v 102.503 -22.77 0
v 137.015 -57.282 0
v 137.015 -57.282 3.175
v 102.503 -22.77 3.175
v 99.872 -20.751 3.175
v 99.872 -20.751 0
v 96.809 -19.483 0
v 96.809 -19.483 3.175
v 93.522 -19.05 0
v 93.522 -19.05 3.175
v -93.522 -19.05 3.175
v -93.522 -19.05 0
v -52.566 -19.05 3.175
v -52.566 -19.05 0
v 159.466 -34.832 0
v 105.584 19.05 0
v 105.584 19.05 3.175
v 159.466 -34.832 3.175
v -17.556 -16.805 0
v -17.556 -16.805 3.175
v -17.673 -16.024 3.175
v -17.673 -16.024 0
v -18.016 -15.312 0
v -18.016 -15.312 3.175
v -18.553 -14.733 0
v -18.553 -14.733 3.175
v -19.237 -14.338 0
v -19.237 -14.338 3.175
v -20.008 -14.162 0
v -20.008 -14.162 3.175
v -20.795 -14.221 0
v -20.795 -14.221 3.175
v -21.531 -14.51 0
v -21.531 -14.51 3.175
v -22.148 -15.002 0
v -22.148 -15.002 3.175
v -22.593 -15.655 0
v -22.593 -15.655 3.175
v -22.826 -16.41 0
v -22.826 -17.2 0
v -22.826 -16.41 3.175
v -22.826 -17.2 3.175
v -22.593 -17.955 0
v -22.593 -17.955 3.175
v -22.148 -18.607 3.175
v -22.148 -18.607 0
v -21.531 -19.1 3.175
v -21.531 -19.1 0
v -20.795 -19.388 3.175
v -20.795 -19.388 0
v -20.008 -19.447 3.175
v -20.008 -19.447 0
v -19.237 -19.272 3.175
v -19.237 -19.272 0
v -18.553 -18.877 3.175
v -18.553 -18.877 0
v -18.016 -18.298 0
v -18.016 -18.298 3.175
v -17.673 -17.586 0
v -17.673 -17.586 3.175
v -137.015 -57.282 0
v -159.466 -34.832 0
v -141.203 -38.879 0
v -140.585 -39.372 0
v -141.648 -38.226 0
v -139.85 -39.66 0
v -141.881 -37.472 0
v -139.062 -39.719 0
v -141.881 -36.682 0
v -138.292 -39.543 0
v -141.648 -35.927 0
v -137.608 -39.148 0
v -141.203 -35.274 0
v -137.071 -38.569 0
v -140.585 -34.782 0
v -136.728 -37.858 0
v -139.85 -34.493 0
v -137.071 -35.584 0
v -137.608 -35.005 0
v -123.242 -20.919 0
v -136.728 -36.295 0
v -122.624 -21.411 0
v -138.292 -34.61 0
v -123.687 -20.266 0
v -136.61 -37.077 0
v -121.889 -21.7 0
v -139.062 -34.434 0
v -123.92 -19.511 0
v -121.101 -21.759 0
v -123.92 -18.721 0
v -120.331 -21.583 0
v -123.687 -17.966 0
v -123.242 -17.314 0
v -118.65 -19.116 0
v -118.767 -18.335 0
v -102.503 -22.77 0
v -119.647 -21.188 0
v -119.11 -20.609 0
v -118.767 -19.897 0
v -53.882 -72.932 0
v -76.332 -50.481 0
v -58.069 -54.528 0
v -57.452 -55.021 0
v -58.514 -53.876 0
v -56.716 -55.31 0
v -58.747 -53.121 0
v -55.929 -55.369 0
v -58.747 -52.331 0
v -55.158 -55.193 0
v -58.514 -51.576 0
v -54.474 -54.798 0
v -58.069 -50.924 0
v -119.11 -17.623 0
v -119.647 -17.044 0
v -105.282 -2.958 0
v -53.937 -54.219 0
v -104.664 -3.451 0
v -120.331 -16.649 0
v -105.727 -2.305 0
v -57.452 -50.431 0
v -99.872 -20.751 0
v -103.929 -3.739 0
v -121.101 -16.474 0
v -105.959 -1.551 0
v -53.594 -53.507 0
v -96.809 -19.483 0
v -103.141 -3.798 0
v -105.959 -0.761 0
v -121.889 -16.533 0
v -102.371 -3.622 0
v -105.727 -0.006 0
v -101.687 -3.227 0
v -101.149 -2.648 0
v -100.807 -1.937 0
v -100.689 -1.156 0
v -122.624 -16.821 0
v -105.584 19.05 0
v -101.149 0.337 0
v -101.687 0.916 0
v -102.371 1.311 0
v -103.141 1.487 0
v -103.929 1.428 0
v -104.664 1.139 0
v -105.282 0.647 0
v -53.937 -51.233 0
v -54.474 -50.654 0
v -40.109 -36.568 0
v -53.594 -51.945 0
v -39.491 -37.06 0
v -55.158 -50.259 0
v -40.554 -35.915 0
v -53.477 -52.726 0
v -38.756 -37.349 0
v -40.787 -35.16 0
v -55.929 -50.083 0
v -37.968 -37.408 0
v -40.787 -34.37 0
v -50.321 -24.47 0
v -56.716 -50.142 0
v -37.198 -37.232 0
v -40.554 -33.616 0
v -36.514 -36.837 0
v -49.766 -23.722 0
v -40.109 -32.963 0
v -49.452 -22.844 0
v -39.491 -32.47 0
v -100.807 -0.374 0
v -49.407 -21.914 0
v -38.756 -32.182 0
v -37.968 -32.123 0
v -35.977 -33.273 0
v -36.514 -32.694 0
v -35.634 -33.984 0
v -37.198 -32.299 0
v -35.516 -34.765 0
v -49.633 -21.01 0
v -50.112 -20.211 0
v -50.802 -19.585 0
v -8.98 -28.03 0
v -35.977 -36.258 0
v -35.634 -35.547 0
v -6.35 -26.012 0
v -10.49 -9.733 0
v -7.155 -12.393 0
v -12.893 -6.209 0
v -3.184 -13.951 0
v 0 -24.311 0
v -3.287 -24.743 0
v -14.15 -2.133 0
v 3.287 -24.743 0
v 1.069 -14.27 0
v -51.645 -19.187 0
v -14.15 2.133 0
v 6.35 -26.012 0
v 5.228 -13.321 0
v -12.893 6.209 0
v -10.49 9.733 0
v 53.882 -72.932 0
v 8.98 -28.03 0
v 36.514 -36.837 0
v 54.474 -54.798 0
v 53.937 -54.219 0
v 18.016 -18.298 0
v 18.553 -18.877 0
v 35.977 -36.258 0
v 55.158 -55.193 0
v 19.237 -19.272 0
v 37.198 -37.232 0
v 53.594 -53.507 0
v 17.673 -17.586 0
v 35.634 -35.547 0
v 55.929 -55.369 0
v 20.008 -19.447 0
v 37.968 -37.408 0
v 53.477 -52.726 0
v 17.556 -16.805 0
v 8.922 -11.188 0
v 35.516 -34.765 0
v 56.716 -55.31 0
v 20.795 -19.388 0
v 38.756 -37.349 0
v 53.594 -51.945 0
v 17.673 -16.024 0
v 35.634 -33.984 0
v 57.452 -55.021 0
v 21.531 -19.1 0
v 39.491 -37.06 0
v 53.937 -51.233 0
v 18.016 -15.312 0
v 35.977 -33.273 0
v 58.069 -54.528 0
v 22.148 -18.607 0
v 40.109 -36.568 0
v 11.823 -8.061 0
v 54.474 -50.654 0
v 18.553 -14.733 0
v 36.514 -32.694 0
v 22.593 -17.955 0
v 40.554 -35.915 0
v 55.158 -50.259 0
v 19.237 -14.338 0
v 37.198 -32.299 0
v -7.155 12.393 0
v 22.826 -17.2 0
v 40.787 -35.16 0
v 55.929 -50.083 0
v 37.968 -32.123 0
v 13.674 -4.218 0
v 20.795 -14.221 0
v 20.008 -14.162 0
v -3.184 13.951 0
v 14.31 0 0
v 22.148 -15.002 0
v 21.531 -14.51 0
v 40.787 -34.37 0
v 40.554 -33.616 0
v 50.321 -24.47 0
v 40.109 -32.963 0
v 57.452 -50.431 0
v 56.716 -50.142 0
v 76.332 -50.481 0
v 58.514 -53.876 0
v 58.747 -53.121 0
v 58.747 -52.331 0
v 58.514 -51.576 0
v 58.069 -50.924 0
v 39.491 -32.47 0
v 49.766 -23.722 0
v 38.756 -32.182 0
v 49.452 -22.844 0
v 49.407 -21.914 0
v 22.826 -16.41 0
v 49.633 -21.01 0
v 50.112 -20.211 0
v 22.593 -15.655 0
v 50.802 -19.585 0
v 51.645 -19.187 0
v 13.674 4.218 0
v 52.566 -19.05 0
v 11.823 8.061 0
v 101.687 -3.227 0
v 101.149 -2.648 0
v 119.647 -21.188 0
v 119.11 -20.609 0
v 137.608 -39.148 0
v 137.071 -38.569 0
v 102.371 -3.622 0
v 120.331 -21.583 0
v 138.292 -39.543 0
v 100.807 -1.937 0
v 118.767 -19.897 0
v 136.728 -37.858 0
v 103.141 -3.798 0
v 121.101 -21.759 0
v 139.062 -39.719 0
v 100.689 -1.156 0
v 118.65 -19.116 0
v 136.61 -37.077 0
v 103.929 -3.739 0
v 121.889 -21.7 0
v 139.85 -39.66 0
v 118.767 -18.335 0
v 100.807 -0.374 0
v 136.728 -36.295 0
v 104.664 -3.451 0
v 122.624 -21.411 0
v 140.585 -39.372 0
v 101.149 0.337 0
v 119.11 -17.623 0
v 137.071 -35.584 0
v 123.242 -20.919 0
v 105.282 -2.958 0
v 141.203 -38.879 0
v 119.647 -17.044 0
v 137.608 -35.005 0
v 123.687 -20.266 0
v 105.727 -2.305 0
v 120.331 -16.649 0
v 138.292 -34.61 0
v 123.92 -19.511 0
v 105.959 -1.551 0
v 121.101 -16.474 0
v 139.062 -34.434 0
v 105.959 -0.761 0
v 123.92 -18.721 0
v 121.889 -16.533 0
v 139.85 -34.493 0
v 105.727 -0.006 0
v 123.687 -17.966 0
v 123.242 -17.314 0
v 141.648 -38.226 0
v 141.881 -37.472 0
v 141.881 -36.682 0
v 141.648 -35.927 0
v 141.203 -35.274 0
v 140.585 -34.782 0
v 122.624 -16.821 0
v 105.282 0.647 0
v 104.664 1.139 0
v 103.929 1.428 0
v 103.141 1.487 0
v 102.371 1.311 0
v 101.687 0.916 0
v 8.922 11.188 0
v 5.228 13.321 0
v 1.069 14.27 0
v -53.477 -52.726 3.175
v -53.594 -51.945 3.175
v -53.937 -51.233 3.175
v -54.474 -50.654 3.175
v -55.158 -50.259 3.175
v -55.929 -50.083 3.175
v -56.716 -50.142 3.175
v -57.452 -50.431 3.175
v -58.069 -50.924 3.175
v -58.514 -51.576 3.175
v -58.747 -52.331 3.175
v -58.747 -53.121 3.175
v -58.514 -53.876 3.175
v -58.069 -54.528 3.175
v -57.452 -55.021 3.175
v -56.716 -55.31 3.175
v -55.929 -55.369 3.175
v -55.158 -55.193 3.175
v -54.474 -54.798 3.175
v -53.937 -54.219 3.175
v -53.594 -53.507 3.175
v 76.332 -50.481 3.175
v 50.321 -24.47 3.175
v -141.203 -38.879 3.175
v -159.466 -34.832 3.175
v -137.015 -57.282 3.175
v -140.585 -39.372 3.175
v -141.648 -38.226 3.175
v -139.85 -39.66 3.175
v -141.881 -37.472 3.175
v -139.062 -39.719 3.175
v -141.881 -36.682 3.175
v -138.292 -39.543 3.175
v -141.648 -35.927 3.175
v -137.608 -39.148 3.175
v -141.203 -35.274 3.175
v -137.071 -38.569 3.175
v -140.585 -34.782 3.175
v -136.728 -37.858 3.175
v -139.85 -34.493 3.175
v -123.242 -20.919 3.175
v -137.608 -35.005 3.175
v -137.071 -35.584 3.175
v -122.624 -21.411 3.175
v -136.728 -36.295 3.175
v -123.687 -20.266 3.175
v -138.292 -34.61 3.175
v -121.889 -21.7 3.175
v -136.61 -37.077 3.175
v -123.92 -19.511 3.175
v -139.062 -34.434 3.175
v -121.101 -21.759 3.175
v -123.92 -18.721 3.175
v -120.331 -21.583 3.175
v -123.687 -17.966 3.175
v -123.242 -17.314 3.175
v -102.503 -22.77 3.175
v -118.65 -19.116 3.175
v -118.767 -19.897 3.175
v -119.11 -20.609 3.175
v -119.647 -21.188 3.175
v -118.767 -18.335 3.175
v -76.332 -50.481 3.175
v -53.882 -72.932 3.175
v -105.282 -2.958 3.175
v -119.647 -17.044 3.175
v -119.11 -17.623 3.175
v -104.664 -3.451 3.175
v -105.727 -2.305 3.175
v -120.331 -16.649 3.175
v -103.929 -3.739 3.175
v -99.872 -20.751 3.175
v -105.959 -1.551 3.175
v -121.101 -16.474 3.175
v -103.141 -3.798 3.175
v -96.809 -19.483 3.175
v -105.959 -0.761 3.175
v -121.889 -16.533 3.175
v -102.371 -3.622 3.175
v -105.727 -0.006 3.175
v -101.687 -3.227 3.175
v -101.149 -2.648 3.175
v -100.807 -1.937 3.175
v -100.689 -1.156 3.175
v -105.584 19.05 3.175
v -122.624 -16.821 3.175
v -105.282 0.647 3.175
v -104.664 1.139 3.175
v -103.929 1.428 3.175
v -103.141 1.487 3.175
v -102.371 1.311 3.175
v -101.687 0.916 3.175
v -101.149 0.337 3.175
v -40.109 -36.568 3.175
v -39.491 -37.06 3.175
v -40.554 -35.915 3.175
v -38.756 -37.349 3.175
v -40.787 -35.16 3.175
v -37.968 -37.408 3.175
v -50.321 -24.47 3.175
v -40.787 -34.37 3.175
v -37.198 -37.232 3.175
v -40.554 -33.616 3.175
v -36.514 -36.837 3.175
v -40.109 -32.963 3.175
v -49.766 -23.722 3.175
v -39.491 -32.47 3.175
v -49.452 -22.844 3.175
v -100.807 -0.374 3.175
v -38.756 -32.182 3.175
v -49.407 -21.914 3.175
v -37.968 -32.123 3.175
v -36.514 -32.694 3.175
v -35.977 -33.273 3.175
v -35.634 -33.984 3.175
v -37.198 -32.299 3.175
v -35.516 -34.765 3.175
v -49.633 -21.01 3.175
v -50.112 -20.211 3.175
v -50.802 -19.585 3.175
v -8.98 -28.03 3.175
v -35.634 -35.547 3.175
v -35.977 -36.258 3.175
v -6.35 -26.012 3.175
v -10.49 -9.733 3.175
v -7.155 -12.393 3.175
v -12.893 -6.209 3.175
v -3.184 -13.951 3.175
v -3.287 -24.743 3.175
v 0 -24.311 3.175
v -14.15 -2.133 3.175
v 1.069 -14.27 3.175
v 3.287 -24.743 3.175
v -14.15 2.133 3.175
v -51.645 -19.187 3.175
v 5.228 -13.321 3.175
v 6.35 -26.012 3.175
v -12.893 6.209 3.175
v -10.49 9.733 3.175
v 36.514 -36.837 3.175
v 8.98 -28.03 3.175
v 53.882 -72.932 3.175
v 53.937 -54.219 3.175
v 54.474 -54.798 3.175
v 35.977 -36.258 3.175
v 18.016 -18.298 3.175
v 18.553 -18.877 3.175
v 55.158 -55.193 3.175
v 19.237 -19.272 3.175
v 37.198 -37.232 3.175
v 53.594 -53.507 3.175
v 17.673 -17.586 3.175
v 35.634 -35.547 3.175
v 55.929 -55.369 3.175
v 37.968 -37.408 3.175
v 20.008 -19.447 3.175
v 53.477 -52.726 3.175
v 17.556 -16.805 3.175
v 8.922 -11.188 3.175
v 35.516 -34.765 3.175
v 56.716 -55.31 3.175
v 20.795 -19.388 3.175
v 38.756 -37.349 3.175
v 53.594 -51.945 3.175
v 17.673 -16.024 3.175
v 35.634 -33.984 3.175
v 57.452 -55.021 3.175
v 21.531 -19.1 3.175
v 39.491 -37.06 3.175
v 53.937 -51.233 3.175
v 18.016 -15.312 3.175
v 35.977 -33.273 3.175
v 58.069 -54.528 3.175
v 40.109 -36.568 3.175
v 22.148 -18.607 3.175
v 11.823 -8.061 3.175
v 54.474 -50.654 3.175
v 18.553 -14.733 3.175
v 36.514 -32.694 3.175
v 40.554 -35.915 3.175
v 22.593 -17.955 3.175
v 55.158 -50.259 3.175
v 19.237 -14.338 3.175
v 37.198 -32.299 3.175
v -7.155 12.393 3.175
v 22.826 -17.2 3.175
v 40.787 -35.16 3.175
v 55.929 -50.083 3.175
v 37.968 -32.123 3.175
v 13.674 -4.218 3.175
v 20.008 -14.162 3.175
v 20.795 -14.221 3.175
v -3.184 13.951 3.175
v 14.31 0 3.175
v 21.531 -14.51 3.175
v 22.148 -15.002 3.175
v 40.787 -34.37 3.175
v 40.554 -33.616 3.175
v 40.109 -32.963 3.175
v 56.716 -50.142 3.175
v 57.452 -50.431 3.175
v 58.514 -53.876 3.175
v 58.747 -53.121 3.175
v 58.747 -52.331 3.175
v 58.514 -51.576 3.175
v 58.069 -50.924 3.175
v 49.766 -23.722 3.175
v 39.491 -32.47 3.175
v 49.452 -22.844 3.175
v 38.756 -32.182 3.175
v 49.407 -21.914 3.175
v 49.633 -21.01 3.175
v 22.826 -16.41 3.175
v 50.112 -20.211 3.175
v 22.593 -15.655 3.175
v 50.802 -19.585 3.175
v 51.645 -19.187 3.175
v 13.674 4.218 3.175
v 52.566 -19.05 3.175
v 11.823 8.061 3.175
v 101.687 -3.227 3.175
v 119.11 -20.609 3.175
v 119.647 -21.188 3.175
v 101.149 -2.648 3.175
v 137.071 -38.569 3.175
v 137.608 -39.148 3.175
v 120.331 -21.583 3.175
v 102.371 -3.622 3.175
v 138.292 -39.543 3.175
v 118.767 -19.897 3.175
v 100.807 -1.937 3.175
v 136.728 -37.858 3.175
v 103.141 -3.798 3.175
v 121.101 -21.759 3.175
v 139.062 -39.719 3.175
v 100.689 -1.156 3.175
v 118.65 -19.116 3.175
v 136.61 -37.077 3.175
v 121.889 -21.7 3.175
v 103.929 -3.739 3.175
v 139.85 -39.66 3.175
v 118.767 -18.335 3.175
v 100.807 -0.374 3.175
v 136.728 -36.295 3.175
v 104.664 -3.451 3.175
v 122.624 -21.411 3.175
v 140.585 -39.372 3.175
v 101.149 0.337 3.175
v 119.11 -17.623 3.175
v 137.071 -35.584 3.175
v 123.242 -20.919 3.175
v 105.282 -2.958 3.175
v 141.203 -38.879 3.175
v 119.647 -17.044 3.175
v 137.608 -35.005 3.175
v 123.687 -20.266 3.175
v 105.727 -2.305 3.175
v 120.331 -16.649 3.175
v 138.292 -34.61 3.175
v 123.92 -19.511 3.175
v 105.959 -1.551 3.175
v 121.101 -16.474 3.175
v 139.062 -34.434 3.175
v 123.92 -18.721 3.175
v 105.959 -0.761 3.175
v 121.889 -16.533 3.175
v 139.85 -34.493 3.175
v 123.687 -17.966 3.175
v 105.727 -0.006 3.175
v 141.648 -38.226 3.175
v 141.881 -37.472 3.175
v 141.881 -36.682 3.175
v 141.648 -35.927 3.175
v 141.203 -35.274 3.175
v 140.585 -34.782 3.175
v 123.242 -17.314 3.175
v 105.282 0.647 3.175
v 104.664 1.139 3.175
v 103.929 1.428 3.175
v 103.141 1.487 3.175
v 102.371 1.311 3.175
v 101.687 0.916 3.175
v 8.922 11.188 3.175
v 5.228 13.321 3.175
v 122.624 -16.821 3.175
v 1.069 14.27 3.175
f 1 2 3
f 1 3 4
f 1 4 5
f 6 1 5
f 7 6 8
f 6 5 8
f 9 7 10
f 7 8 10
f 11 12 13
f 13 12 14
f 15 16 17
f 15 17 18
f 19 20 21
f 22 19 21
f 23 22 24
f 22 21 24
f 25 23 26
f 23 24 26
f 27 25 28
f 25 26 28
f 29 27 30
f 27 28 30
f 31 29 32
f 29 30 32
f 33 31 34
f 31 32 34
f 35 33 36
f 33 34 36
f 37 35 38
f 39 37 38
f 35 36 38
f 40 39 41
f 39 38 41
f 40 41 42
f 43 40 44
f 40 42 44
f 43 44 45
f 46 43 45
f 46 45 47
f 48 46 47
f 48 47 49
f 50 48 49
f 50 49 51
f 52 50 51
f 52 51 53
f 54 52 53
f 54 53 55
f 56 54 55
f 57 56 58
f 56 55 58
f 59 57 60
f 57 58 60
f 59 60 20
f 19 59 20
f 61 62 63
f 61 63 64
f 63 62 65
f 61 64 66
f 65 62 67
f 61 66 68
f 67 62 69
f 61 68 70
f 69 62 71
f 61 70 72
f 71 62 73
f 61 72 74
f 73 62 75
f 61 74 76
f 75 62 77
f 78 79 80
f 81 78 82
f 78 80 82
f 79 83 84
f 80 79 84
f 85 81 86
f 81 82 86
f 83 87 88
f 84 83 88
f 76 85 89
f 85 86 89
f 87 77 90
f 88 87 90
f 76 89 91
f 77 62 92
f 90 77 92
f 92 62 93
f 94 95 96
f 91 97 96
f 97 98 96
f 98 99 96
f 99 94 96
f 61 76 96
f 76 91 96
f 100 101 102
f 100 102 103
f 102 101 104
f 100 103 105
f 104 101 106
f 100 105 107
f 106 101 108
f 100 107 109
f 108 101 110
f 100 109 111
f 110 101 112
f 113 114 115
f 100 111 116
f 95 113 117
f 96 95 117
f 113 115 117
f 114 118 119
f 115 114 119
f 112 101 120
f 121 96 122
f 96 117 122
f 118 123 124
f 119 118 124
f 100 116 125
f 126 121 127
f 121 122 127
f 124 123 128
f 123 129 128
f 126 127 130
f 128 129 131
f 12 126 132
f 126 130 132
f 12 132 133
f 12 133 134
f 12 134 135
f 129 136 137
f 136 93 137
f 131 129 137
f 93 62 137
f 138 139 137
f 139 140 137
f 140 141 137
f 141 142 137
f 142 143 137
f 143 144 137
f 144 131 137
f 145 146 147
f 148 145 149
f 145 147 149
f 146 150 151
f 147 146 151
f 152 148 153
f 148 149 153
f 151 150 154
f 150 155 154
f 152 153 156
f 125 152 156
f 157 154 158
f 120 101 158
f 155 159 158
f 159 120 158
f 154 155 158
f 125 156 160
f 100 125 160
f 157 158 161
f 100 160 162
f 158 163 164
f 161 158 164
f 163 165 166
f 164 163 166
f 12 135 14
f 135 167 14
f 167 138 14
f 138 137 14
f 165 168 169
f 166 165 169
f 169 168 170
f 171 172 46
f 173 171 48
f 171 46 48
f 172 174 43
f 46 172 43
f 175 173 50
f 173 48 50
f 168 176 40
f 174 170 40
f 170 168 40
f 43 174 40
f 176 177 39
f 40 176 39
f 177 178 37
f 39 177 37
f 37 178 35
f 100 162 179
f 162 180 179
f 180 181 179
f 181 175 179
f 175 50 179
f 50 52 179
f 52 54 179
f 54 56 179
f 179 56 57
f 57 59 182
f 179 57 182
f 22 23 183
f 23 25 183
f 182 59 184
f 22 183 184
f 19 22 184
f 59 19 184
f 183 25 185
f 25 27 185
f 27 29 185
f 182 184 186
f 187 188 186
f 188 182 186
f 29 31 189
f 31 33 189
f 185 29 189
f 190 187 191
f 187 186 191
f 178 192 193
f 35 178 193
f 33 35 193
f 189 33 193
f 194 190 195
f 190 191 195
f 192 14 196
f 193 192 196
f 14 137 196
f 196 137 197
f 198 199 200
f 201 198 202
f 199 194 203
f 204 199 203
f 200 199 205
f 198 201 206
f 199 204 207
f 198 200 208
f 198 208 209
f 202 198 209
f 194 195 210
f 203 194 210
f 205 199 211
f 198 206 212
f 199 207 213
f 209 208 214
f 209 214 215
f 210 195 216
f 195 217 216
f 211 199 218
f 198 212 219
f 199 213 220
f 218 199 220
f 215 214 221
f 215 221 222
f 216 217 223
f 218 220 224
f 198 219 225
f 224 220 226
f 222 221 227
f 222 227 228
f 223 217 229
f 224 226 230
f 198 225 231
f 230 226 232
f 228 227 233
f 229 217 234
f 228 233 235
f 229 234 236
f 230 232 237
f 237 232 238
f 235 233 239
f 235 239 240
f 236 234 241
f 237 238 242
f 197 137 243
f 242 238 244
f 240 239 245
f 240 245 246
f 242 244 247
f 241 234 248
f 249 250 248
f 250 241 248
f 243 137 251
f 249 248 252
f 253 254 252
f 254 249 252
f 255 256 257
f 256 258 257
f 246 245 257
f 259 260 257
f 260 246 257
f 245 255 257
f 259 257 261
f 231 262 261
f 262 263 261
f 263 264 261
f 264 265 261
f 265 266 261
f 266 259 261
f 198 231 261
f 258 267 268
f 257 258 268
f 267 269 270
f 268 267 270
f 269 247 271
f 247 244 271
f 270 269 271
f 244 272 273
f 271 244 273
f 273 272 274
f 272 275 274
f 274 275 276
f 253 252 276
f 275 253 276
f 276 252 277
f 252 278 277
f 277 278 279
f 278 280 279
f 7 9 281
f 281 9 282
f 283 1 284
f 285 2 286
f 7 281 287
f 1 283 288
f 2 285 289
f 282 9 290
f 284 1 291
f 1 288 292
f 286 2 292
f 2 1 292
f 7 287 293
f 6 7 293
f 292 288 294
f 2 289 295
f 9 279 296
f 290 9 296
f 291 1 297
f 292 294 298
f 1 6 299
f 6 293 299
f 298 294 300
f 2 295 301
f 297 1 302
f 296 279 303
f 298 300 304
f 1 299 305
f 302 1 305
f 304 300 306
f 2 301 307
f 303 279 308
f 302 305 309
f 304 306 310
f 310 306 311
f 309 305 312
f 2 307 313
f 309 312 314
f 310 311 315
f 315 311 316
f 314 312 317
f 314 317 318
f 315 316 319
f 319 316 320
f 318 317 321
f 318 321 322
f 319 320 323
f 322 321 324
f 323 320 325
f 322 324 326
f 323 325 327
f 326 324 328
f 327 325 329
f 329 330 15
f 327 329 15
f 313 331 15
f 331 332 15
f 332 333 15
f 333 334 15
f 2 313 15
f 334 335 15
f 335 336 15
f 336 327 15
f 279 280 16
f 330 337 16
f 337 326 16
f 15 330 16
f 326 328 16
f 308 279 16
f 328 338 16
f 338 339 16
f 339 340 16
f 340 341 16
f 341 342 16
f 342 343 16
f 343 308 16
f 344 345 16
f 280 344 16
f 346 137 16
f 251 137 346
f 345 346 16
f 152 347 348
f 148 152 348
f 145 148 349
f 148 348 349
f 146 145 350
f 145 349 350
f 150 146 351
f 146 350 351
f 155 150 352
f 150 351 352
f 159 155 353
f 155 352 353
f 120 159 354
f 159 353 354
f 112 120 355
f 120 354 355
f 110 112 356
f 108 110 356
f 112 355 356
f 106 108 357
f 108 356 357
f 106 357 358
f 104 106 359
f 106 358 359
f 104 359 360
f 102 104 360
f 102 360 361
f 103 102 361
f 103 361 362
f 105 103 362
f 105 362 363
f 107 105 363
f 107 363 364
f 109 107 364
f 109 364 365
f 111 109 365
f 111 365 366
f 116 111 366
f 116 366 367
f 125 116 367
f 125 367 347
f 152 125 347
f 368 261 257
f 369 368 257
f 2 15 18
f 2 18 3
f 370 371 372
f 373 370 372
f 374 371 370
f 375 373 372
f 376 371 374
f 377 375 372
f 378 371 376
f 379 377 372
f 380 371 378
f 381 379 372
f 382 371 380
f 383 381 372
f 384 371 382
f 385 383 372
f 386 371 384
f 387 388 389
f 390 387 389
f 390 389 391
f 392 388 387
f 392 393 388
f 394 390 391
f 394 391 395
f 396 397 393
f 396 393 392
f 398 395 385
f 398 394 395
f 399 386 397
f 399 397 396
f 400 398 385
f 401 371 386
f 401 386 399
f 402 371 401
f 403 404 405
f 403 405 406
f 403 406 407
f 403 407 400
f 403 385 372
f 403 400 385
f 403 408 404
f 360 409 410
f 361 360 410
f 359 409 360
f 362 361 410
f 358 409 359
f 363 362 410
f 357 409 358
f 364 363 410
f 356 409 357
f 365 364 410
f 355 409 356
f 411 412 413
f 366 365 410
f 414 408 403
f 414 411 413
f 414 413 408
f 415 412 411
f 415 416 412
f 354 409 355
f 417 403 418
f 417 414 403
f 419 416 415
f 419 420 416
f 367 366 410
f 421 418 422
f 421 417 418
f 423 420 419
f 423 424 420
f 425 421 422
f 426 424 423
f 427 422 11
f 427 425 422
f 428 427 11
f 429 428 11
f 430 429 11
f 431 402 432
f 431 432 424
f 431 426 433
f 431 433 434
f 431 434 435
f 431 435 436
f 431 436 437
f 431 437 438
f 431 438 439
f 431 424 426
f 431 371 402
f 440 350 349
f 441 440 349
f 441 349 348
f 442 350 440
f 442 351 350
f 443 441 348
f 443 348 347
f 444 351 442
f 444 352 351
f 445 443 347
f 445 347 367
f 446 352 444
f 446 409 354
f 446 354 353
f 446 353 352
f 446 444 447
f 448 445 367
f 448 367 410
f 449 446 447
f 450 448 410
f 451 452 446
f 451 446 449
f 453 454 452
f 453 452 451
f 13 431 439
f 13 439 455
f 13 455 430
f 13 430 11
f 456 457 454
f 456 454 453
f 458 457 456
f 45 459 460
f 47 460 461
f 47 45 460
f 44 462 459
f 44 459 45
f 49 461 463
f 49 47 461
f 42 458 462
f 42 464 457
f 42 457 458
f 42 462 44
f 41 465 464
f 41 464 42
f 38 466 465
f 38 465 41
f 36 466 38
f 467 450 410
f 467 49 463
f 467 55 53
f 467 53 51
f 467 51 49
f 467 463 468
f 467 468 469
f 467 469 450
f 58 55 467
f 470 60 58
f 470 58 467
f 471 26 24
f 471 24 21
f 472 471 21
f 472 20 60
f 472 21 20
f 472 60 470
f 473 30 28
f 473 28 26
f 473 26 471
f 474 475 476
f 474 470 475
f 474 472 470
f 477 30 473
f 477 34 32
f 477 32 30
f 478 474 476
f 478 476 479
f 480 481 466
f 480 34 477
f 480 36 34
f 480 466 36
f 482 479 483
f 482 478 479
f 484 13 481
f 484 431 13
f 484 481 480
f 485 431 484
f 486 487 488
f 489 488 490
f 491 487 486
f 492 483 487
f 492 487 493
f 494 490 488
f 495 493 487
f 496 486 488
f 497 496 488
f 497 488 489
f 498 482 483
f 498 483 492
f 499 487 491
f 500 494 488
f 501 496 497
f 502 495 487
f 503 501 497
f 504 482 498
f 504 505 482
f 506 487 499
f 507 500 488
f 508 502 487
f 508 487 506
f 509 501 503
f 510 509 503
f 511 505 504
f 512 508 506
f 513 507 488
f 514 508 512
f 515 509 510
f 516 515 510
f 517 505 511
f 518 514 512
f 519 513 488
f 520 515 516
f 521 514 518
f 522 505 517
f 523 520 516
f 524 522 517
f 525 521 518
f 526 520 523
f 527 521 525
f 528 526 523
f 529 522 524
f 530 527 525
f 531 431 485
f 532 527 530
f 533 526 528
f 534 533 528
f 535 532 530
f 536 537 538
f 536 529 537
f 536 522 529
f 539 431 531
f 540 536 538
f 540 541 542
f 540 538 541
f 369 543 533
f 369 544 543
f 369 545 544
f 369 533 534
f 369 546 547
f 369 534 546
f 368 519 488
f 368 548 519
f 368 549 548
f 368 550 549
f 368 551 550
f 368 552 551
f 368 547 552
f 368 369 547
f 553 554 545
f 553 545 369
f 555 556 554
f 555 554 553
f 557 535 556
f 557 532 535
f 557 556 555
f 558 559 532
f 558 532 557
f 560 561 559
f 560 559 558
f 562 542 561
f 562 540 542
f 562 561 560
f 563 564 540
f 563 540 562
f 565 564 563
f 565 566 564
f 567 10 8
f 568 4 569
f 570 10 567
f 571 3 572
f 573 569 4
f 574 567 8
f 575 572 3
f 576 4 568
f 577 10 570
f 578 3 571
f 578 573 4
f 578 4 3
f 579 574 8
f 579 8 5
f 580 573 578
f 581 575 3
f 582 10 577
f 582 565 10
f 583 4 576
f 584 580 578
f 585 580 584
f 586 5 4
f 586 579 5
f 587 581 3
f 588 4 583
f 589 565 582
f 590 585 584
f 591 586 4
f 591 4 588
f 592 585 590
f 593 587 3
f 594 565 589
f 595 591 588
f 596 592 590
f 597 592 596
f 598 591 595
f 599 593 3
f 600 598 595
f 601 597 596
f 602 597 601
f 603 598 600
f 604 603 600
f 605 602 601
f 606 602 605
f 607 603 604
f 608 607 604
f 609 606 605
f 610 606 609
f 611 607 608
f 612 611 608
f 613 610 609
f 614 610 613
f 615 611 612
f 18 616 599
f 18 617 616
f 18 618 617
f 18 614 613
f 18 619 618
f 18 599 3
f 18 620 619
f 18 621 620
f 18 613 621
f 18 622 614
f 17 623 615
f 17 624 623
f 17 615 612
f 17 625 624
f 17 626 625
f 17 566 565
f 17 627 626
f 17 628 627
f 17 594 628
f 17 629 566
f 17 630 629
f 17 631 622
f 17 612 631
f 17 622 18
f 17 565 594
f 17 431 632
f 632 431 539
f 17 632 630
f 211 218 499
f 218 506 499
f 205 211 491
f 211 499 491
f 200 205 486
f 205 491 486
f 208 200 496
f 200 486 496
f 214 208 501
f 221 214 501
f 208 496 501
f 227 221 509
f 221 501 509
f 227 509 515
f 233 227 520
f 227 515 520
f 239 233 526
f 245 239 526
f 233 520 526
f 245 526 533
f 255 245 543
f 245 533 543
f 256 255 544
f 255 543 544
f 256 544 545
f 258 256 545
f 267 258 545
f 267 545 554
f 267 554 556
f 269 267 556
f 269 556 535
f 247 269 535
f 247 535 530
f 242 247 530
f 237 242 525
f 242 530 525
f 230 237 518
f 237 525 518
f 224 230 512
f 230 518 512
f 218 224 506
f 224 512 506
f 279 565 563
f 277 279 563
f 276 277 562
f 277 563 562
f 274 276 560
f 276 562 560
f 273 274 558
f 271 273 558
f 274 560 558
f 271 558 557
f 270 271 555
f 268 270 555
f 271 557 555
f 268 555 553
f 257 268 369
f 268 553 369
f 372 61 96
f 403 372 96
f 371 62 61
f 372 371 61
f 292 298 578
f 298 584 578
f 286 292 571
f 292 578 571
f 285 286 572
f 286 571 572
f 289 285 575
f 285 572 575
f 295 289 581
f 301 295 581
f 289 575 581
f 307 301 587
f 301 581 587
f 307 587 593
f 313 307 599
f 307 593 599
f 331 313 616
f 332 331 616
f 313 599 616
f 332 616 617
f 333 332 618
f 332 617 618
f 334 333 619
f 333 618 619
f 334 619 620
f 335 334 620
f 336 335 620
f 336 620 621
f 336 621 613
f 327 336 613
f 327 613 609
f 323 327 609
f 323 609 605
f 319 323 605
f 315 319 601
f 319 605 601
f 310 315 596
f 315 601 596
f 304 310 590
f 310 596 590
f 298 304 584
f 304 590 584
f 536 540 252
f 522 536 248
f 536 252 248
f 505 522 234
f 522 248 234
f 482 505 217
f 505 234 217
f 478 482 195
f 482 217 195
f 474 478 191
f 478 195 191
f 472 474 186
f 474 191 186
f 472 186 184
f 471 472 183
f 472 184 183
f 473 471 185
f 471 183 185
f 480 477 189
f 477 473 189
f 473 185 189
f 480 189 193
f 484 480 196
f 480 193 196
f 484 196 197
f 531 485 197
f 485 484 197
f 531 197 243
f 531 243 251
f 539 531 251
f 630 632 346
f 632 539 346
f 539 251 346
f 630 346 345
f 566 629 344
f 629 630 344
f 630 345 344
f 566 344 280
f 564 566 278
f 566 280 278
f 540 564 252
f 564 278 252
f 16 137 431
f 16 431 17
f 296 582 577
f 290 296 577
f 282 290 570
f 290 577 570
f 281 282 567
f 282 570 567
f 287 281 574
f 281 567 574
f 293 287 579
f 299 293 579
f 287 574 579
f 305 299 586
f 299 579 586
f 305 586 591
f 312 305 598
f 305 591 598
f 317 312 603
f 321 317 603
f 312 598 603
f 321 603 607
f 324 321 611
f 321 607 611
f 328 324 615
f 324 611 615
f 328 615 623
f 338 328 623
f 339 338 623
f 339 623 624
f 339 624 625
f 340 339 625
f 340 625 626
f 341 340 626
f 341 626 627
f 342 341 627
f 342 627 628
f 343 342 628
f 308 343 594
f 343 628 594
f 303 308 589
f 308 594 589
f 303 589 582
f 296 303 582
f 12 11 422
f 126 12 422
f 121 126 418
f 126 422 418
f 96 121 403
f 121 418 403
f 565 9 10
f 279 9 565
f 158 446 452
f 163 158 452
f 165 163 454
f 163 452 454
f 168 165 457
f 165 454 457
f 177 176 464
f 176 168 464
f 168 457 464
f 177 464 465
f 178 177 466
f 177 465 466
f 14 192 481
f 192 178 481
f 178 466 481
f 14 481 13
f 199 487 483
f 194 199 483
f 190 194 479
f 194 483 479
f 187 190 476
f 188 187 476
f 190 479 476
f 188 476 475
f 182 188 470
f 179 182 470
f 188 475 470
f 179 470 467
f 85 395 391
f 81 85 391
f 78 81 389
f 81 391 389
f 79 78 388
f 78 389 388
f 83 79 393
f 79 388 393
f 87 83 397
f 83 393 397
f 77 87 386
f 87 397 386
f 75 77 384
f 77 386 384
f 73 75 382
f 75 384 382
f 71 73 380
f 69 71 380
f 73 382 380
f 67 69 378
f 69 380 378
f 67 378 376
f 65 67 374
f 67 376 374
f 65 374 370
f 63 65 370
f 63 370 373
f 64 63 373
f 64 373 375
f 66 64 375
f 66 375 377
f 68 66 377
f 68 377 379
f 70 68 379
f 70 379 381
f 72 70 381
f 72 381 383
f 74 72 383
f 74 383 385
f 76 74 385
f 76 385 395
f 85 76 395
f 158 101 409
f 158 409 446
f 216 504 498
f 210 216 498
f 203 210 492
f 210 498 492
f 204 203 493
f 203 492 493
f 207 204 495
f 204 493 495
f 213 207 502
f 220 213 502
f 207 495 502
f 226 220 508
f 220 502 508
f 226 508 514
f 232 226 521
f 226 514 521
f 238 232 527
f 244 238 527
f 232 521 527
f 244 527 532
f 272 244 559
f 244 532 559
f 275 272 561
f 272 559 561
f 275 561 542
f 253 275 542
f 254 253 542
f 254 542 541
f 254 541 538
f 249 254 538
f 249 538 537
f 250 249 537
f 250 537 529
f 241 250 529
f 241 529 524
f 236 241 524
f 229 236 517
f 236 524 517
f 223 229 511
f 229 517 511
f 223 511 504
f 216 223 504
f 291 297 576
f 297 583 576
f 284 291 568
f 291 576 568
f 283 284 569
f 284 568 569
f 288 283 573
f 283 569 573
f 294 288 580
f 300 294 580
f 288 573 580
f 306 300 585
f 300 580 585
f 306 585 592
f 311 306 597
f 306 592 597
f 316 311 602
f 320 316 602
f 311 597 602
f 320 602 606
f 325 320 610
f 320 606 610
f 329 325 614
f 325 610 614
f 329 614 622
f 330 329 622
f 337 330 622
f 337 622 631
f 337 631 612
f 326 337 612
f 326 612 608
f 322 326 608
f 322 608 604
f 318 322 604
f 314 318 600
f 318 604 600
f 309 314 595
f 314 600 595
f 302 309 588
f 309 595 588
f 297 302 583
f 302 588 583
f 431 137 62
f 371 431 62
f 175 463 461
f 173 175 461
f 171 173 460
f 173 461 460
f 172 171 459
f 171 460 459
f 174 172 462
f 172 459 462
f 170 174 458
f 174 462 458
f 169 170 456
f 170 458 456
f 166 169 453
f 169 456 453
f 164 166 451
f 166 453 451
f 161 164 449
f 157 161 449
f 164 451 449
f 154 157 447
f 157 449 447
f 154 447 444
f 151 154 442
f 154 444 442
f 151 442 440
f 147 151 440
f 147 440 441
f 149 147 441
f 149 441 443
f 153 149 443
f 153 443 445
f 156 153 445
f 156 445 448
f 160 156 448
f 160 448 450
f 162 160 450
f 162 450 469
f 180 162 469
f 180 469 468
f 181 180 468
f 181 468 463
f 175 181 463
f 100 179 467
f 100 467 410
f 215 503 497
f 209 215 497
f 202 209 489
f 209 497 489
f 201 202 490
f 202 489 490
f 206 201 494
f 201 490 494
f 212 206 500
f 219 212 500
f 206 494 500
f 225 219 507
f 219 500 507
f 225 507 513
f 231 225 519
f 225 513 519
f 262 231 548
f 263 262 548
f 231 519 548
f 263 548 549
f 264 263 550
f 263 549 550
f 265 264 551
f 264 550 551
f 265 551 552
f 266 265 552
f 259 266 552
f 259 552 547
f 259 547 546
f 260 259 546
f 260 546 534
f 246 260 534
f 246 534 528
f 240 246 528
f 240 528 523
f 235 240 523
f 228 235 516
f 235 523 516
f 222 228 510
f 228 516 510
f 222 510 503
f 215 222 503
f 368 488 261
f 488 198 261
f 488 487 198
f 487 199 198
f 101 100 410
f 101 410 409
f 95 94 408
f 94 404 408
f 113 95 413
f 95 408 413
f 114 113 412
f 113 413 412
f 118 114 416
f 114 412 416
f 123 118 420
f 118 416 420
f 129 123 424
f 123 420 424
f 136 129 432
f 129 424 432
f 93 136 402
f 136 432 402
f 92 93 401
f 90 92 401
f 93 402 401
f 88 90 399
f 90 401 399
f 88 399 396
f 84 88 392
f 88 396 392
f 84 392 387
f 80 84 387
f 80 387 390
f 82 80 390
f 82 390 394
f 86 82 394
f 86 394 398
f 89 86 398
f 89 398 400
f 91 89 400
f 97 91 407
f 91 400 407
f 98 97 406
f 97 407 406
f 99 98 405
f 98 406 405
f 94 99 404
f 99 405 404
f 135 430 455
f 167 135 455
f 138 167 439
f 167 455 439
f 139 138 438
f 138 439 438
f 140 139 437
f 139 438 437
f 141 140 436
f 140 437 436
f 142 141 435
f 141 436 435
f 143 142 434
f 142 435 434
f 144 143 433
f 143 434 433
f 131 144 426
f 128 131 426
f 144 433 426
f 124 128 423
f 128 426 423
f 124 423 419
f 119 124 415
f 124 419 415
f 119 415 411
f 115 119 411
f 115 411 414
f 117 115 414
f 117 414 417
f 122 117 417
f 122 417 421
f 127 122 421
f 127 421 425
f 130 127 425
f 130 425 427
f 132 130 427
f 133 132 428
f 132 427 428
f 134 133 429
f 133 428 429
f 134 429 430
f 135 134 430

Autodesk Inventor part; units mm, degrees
ref_plane "YZ Plane" through (0, 0, 0) normal (1, 0, 0) x (0, 1, 0)
ref_plane "XZ Plane" through (0, 0, 0) normal (0, 1, 0) x (-1, 0, 0)
ref_plane "XY Plane" through (0, 0, 0) normal (0, 0, 1) x (1, 0, 0)
sketch "Sketch1" plane through (0, 0, 0) normal (0, 0, 1) x (1, 0, 0)
  circle A0 centre (0, 0) radius 14.31
  line L0 (-76.3322, -50.4809) -> (-44.9013, -19.05)
  line L1 (0, -91.3278) -> (0, 37.4463) projected
  line L2 (0, -19.05) -> (-53.8815, -72.9315)
  line L3 (-53.8815, -72.9315) -> (-76.3322, -50.4809)
  line L4 (0, 19.05) -> (-105.5841, 19.05)
  line L5 (-105.5841, 19.05) -> (-159.4656, -34.8315)
  line L6 (-159.4656, -34.8315) -> (-137.015, -57.2822)
  line L7 (-137.015, -57.2822) -> (-98.7828, -19.05)
  line L8 (-98.7828, -19.05) -> (-44.9013, -19.05)
  line L9 (76.3322, -50.4809) -> (44.9013, -19.05)
  line L10 (0, -19.05) -> (53.8815, -72.9315)
  line L11 (53.8815, -72.9315) -> (76.3322, -50.4809)
  line L12 (0, 19.05) -> (105.5841, 19.05)
  line L13 (105.5841, 19.05) -> (159.4656, -34.8315)
  line L14 (159.4656, -34.8315) -> (137.015, -57.2822)
  line L15 (137.015, -57.2822) -> (98.7828, -19.05)
  line L16 (98.7828, -19.05) -> (44.9013, -19.05)
  line L17 (0, -19.05) -> (-10.6721, -29.7221)
  point P0 (-66.8959, -41.0446)
  dimension "d1" = 28.62
  dimension "d4" = 76.2
  dimension "d6" = 45
  dimension "d15" = 31.75
  dimension "d59" = 31.75
  dimension "d61" = 101.6
  dimension "d62" = 38.1
  dimension "d63" = 19.05
  dimension "d83" = 19.05
extrude "Extrusion1" add sketch "Sketch1" along normal blind 3.175 contours A0 L1 L12 L13 L14 L15 L16 L9 L11 L10 | A0 L1 L2 L3 L0 L8 L7 L6 L5 L4
sketch "Sketch3" plane through (0, 0, 3.175) normal (0, 0, 1) x (1, 0, 0)
  line L0 (53.8815, -72.9315) -> (76.3322, -50.4809) projected
  line L1 (76.3322, -50.4809) -> (44.9013, -19.05) projected
  line L2 (44.9013, -19.05) -> (98.7828, -19.05) projected
  line L3 (98.7828, -19.05) -> (137.015, -57.2822) projected
  line L4 (137.015, -57.2822) -> (159.4656, -34.8315) projected
  line L5 (159.4656, -34.8315) -> (105.5841, 19.05) projected
  line L6 (105.5841, 19.05) -> (-105.5841, 19.05) projected
  line L7 (-105.5841, 19.05) -> (-159.4656, -34.8315) projected
  line L8 (-159.4656, -34.8315) -> (-137.015, -57.2822) projected
  line L9 (-137.015, -57.2822) -> (-98.7828, -19.05) projected
  line L10 (-98.7828, -19.05) -> (-44.9013, -19.05) projected
  line L11 (-44.9013, -19.05) -> (-76.3322, -50.4809) projected
  line L12 (-76.3322, -50.4809) -> (-53.8815, -72.9315) projected
  line L13 (-53.8815, -72.9315) -> (0, -19.05) projected
  line L14 (0, -19.05) -> (53.8815, -72.9315) projected
  circle A0 centre (0, 0) radius 14.31 projected
  line L15 (-148.2403, -46.0569) -> (-83.1335, 19.05)
  line L16 (-65.1069, -61.7062) -> (15.6494, 19.05)
  circle A1 centre (-139.2601, -37.0766) radius 2.65
  circle A2 centre (-121.2995, -19.1161) radius 2.65
  circle A3 centre (-103.339, -1.1556) radius 2.65
  circle A4 centre (-56.1266, -52.726) radius 2.65
  circle A5 centre (-38.1661, -34.7654) radius 2.65
  circle A6 centre (-20.2056, -16.8049) radius 2.65
  dimension "d64" = 5.3
  dimension "d67" = 25.4
  dimension "d72" = 12.7
  dimension "d73" = 12.7
  dimension "d76" = 25.4
extrude "Extrusion3" cut sketch "Sketch3" against normal blind 25.4 contours A4 L16 | L16 A4 | A5 L16 | L16 A5 | A6 L16 | L16 A6 | A3 L15 | L15 A3 | A1 L15 | L15 A1 | A2 L15 | L15 A2
mirror "Mirror2" about plane through (0, 0, 0) normal (1, 0, 0) of "Extrusion3"
fillet "Fillet1" radius 12.7 3 edges at (-98.7828, -19.05, 1.5875) (0, -19.05, 1.5875) (98.7828, -19.05, 1.5875)
fillet "Fillet2" radius 3.175 2 edges at (-44.9013, -19.05, 1.5875) (44.9013, -19.05, 1.5875)
equation "\"d1\" = bearingDiameter"
equation "\"d4\" = boltedLength"
equation "\"d6\" = 0.5 * theta12"
equation "\"d59\" = d15"
equation "\"d61\" = gearboxLength"
equation "\"d63\" = 0.5 * d62"
equation "\"d83\" = d63"
equation "\"topDiameter\" = 45"
equation "\"bearingDiameter\" = 28.62"
equation "\"plateThickness\" = 6.35"
equation "\"theta12\" = 90deg"
equation "\"gearboxLength\" = 101.6"
equation "\"boltedLength\" = 76.2"
equation "\"topDiameter_1\" = 25"
equation "\"shaftLength_1\" = 76.2"
equation "\"bearingDiameter_1\" = 28.62"
equation "\"plateThickness_1\" = 6.35"
equation "\"theta12_1\" = 100deg"
equation "\"boltDiameter_1\" = 6"
equation "\"gearboxLength_1\" = 101.6"
equation "\"boltedLength_1\" = 76.2"
equation "\"innerBoltSpacing_1\" = 12.7"
equation "\"outerBoltSpacing_1\" = 12.7"
equation "\"shaftLength\" = 76.2"
equation "\"boltDiameter\" = 5.3"
equation "\"outerBoltSpacing\" = 12.7"
equation "\"innerBoltSpacing\" = 12.7"
properties part number "CH1-01-KneePivotPlate" material "Aluminum 6061"
